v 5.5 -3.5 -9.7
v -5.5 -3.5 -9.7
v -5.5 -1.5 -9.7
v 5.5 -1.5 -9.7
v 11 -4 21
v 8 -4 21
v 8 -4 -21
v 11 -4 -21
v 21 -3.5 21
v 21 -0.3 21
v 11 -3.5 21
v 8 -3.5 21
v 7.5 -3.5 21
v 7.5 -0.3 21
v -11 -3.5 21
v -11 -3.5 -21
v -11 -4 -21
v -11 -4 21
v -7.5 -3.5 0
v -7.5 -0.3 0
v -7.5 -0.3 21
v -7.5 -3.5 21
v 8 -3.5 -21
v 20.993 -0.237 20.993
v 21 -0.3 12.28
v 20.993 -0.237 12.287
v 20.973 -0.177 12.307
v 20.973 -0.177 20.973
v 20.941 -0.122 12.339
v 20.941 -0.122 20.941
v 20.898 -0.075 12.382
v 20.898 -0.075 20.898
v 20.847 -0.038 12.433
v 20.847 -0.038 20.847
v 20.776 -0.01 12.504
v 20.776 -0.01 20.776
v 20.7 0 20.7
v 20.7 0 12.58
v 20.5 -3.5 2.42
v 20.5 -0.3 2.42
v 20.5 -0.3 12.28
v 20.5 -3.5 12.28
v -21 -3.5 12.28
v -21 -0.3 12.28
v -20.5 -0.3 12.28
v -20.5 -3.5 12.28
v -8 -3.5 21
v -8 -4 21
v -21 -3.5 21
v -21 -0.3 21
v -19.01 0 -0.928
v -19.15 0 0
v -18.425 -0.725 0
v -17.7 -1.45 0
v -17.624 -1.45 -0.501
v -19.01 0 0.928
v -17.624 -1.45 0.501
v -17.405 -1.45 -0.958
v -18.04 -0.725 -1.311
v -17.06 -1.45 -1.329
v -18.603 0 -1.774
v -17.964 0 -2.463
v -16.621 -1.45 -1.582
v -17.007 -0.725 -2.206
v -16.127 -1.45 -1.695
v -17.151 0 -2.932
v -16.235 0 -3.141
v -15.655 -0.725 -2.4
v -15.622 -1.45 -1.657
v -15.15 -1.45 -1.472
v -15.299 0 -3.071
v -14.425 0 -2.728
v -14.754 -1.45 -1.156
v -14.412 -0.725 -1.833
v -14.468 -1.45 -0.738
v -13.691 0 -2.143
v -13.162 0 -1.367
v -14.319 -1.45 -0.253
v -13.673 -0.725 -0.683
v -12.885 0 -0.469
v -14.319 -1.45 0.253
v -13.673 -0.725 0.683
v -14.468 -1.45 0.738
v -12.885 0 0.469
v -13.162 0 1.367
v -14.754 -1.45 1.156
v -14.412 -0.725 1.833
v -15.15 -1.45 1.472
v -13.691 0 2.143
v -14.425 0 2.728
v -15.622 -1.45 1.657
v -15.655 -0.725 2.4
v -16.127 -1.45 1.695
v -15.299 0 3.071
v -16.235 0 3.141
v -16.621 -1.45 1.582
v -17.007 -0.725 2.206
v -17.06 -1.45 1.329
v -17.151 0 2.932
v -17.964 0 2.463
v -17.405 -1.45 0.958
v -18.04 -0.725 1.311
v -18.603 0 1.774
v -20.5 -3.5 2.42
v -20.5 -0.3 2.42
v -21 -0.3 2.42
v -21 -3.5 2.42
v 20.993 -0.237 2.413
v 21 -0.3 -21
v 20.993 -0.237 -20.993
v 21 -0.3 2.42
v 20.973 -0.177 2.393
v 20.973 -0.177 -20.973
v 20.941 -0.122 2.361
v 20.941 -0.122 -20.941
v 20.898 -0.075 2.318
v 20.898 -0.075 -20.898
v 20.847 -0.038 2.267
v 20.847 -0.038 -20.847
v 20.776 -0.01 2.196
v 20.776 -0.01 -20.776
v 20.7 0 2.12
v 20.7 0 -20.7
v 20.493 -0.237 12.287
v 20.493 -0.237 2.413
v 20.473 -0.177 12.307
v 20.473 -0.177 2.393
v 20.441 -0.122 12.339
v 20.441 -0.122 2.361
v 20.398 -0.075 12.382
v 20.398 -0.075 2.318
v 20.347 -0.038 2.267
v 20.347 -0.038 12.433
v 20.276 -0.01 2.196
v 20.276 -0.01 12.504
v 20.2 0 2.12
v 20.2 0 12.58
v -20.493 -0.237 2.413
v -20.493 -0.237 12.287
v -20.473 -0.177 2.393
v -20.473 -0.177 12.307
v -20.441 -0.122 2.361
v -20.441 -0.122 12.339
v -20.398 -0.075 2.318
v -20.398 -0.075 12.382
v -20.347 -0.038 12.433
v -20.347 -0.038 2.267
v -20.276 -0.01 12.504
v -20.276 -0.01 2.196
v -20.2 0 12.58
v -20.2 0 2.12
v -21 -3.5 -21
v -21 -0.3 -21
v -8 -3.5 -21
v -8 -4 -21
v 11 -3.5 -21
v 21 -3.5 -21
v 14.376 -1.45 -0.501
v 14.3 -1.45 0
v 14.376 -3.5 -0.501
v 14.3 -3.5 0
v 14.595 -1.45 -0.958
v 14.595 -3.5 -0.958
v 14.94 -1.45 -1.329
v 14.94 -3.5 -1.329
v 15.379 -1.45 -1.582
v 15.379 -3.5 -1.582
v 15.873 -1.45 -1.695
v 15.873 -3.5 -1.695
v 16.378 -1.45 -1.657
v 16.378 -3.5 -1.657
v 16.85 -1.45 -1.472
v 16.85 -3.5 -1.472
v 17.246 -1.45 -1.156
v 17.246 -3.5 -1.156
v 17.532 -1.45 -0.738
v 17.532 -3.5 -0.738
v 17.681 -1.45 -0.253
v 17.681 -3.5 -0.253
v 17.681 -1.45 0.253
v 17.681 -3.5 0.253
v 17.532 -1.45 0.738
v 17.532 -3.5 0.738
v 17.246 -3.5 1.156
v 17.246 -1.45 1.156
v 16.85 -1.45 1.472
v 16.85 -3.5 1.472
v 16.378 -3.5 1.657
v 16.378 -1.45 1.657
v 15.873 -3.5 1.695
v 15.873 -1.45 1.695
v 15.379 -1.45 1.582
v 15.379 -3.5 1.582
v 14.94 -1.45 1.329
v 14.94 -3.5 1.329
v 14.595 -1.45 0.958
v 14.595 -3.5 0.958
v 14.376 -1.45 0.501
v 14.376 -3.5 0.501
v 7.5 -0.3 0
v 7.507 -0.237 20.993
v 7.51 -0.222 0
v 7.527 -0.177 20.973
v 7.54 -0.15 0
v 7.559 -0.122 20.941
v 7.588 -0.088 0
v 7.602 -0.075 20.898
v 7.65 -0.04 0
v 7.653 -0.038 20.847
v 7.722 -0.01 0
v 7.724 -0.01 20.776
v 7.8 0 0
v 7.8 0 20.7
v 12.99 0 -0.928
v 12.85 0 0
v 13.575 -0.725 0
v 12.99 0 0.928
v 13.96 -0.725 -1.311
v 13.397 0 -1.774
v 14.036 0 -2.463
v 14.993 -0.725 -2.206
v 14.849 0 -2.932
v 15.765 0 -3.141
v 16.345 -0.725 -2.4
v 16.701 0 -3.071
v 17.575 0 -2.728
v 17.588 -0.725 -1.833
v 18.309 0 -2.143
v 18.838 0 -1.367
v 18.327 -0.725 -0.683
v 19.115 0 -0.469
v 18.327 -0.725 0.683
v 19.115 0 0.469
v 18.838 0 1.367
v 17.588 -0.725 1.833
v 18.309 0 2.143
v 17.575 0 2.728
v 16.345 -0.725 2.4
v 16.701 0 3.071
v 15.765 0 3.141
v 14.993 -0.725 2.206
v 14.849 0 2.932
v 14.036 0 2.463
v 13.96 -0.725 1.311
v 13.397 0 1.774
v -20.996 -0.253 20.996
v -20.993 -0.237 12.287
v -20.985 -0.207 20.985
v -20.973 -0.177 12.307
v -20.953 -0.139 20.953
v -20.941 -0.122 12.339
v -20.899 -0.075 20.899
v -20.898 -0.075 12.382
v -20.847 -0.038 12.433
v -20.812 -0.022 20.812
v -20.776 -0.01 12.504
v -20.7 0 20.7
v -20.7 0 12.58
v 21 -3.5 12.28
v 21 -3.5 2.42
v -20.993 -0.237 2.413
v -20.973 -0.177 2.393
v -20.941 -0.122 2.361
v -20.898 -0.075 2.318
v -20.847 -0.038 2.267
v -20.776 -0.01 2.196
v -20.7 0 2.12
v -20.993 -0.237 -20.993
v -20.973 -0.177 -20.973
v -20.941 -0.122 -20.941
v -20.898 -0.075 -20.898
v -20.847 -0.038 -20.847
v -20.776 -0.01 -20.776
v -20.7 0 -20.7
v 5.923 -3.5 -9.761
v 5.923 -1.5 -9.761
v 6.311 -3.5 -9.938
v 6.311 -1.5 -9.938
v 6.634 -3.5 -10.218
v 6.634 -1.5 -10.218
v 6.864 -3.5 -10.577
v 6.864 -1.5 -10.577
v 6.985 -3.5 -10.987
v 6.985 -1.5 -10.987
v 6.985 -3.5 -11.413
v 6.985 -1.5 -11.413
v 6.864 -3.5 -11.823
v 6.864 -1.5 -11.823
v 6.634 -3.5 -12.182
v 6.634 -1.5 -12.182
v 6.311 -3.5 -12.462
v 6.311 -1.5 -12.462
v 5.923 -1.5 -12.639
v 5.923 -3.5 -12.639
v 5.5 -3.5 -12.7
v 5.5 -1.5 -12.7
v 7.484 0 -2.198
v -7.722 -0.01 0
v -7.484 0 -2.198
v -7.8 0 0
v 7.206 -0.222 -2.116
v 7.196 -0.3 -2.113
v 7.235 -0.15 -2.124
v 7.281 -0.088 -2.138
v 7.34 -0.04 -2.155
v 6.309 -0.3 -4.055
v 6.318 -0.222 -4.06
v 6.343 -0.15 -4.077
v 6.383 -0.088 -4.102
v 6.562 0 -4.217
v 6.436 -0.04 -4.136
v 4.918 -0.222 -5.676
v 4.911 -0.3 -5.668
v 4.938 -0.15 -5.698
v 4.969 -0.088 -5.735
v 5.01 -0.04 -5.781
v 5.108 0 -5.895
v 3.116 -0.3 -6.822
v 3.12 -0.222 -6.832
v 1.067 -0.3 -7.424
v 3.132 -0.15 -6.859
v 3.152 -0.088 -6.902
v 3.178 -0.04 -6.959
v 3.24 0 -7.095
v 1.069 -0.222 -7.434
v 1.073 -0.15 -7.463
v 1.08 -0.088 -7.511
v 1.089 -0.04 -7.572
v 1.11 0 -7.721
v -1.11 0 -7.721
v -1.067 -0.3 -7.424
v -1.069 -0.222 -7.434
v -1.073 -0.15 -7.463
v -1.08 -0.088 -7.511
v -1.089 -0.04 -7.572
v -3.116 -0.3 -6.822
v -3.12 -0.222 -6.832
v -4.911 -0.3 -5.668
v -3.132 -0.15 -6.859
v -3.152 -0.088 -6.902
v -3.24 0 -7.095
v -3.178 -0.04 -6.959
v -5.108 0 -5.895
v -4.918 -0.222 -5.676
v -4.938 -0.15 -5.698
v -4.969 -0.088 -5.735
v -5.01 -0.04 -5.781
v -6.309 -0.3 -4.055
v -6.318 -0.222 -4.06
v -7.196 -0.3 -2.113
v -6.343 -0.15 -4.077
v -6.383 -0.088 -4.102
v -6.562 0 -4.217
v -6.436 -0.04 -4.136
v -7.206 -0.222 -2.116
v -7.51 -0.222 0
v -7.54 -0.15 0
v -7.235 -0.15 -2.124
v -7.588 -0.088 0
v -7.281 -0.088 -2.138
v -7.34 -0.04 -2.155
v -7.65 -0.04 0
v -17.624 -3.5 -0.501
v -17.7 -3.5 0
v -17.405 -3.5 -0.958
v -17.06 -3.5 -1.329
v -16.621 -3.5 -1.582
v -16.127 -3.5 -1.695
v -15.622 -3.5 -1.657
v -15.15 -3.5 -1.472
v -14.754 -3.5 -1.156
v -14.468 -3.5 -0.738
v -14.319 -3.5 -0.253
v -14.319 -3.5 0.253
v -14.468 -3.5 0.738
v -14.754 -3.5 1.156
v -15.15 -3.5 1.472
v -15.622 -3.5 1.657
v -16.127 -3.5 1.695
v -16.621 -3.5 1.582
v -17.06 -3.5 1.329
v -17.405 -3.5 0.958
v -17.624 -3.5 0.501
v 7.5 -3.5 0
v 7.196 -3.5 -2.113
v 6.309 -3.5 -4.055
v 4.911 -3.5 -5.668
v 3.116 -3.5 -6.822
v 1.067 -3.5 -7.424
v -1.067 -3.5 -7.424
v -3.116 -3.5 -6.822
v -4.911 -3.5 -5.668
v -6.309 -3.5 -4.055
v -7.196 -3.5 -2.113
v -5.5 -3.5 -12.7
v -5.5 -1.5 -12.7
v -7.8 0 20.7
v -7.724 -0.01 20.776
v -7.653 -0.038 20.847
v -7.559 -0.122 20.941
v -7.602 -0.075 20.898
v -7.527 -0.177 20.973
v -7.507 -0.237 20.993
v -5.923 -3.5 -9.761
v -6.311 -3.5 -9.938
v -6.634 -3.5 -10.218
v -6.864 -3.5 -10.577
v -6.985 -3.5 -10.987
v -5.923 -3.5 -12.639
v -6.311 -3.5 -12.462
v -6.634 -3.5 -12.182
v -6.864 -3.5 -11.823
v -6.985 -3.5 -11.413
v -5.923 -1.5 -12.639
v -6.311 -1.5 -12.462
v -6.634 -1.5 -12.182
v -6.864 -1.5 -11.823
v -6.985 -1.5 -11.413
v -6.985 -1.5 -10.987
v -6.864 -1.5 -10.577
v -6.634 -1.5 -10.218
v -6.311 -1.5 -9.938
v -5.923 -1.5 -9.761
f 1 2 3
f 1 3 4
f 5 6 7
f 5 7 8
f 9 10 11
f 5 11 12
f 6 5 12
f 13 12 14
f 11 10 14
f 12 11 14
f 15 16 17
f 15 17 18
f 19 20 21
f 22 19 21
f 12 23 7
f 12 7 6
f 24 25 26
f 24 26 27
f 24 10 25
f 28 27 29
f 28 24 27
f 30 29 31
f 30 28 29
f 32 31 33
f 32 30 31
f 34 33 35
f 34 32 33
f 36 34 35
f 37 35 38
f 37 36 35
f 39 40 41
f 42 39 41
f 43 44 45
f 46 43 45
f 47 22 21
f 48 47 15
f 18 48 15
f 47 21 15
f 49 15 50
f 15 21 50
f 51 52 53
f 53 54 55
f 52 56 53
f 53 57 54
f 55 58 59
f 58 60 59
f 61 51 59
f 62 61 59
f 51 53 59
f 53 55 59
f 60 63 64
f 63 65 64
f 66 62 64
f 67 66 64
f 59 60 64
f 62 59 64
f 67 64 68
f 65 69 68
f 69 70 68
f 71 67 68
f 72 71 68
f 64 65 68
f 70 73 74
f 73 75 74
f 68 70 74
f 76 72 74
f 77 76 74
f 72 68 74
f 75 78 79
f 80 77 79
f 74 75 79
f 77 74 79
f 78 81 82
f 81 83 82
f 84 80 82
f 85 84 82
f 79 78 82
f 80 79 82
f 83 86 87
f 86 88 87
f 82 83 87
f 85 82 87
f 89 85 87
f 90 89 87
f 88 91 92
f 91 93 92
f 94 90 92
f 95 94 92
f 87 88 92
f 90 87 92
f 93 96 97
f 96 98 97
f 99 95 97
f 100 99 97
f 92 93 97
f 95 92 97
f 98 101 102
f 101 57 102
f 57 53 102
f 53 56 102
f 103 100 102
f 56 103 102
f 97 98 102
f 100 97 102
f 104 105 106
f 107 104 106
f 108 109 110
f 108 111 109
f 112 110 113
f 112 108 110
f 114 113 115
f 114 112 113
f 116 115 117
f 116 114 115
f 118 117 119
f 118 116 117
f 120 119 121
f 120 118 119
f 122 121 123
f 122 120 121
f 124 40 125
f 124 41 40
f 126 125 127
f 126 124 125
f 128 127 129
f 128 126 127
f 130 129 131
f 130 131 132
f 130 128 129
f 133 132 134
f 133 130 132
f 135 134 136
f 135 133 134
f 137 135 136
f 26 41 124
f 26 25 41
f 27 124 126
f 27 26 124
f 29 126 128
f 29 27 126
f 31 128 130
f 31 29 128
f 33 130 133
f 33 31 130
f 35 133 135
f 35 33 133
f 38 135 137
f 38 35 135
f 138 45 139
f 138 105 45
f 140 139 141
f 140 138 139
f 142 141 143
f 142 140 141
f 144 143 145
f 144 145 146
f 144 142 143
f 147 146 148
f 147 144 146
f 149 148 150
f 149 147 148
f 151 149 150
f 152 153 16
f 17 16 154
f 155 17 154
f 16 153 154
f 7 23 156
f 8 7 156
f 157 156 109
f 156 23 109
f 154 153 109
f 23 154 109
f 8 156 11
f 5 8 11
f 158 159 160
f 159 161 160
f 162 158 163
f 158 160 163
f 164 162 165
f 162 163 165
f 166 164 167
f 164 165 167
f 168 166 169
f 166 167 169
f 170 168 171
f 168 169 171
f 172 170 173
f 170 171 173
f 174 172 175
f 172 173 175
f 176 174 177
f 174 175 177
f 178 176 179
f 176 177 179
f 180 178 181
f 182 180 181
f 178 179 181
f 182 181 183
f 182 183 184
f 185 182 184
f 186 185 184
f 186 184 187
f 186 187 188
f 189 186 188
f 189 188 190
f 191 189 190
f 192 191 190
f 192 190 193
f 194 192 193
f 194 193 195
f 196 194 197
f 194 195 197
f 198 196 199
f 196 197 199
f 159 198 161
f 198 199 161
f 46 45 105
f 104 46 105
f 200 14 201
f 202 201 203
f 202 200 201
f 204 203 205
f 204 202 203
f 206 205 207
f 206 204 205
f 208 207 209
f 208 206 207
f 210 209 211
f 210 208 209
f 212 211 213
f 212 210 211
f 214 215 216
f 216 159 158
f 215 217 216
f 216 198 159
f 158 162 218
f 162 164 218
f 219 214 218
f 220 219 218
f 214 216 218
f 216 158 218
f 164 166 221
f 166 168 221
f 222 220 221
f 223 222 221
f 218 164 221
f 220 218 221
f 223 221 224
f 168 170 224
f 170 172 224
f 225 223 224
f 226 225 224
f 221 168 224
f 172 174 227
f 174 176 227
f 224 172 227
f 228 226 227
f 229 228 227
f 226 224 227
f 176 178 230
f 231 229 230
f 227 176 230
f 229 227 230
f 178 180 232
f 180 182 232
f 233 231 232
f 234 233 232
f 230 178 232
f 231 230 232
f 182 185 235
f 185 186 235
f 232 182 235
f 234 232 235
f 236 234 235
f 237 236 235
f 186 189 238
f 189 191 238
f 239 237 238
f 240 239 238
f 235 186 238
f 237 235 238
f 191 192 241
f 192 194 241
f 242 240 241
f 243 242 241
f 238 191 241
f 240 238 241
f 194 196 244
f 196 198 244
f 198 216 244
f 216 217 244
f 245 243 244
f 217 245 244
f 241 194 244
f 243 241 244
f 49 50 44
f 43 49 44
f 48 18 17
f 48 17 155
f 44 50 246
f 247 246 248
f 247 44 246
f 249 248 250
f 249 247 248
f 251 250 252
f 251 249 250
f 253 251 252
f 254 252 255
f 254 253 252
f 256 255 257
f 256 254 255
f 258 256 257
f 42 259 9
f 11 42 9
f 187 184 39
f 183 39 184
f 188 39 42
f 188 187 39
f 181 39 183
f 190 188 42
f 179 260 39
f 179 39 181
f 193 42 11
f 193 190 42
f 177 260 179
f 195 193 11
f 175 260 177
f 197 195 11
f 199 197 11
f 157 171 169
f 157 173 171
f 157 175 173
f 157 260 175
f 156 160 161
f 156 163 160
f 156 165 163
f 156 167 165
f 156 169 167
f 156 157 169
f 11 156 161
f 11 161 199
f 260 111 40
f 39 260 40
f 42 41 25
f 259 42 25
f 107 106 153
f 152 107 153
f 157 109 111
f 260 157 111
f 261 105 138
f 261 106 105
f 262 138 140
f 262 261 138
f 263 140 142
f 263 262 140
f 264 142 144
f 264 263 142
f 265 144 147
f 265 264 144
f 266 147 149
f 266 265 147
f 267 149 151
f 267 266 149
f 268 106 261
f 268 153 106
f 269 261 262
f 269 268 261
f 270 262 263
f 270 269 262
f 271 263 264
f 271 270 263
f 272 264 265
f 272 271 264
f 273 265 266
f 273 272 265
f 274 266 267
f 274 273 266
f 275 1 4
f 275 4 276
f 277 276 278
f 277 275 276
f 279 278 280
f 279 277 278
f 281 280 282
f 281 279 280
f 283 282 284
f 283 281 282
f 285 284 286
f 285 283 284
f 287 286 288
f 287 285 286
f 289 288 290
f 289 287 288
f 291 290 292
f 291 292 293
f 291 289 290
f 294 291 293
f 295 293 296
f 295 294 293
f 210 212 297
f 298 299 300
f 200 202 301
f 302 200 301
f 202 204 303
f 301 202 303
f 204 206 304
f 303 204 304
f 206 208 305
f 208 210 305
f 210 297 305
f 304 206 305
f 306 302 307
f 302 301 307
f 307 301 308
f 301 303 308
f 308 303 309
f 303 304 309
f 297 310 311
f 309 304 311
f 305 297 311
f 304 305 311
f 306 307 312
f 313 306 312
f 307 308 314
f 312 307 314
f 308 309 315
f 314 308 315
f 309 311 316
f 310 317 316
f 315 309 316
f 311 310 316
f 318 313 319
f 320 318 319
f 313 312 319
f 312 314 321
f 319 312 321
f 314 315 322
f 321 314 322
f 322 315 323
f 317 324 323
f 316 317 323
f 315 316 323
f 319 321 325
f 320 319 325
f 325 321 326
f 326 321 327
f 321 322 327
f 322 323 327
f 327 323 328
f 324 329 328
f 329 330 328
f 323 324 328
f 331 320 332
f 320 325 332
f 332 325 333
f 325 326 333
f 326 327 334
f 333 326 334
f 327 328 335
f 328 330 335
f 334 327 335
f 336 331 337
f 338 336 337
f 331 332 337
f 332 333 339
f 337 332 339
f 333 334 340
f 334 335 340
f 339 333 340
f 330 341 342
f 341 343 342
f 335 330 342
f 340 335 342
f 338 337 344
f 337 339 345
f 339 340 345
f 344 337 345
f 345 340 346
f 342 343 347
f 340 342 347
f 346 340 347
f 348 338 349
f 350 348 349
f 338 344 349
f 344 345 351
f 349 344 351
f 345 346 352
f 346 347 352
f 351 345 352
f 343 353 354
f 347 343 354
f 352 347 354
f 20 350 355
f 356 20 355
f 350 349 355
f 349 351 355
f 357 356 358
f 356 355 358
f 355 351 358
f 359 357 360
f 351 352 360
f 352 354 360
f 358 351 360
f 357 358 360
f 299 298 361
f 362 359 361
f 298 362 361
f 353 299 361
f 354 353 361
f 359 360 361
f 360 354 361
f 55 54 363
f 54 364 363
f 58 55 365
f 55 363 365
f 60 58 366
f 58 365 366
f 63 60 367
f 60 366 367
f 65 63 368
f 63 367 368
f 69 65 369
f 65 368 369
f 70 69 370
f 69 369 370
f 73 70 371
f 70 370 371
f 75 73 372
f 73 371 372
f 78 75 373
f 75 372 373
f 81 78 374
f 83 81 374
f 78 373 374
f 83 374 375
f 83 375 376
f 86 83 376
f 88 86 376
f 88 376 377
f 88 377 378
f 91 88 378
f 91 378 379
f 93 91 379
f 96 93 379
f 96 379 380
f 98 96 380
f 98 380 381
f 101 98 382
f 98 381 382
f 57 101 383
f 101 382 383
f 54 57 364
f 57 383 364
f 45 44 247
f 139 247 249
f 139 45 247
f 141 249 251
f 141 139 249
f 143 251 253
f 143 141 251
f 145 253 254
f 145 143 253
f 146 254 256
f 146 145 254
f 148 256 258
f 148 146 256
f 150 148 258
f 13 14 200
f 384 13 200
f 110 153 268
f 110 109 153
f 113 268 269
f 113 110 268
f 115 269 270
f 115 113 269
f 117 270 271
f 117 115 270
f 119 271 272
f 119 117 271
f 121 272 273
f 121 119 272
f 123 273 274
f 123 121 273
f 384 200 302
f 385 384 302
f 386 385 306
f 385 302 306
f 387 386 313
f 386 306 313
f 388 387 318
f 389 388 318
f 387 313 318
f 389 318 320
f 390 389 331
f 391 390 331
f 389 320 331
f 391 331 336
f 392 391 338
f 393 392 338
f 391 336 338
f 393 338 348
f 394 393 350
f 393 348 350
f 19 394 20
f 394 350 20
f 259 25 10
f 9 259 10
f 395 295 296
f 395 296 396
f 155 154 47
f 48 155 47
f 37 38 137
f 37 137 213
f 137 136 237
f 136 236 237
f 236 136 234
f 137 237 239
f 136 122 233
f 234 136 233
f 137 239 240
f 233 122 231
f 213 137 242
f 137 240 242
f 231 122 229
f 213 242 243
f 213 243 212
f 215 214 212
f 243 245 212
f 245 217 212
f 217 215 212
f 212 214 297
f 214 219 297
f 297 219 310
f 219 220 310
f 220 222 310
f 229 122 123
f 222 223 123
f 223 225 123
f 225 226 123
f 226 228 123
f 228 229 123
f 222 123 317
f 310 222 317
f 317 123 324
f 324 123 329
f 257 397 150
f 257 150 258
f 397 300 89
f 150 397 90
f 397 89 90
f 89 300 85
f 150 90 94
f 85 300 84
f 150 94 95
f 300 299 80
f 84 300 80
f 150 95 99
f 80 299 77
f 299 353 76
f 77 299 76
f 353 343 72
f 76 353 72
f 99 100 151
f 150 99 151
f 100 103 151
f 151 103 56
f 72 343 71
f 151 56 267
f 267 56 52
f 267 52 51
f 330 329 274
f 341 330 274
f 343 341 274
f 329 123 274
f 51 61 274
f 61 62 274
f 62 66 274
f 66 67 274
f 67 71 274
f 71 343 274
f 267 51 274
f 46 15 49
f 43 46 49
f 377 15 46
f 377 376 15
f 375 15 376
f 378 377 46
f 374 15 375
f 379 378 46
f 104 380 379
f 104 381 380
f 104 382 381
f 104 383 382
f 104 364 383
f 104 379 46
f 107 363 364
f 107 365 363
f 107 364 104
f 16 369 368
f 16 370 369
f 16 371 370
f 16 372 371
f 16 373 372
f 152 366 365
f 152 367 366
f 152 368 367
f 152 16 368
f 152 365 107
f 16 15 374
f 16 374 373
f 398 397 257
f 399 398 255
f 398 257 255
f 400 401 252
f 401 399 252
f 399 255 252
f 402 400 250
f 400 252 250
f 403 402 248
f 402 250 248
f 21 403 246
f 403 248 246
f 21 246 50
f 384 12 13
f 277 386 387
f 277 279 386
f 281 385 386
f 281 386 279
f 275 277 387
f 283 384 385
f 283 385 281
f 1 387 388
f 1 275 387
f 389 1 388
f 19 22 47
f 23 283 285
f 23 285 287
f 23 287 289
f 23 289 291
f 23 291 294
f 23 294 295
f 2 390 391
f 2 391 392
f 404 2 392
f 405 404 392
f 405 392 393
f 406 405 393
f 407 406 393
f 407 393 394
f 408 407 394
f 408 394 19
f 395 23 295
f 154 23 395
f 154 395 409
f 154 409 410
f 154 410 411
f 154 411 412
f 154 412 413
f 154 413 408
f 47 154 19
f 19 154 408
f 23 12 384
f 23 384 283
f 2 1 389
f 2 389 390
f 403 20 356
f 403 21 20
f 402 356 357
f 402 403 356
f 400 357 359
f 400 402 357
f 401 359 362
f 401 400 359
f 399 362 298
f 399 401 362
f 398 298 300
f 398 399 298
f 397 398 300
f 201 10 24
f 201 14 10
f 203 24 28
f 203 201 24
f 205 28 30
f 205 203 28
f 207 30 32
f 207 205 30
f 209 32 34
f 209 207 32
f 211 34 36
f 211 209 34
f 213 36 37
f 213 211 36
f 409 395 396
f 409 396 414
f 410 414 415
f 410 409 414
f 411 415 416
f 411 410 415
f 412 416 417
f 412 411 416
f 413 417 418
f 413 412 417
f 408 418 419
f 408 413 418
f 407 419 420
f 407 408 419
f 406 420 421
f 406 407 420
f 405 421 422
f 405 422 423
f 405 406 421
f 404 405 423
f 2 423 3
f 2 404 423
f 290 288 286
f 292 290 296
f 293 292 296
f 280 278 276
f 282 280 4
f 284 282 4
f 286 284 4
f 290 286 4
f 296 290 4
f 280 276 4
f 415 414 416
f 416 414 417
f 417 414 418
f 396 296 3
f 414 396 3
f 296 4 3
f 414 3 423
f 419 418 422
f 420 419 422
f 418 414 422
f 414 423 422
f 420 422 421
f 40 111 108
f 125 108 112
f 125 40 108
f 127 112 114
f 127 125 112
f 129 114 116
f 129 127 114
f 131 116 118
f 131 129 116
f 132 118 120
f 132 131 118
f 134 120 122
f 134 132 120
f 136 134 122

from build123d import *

# Parameters (mm, degrees)
SALIENTE_EXTRUIR1_DEPTH                              = 3.5
AVELLANADO_PARA_TORNILLO_CON_CABEZA_PLAN_D           = 3.4
AVELLANADO_PARA_TORNILLO_CON_CABEZA_PLAN_CSINK_D     = 6.3
AVELLANADO_PARA_TORNILLO_CON_CABEZA_PLAN_CSINK_ANGLE = 90
REDONDEO1_R                                          = 0.3
CROQUIS4_W                                           = 3
CROQUIS4_H                                           = 42
SALIENTE_EXTRUIR2_DEPTH                              = 0.5
CORTAR_EXTRUIR1_DEPTH                                = 2


with BuildPart() as part:
    # Croquis1 → Saliente-Extruir1 (new body)
    with BuildSketch(Plane(origin=(0, 0, 0), x_dir=(1, 0, 0), z_dir=(0, 1, 0))):
        with BuildLine():
            Line((-7.5, 0), (-7.5, -21))
            Line((-7.5, -21), (-21, -21))
            Line((-21, -21), (-21, -12.28))
            Line((-21, -12.28), (-20.5, -12.28))
            Line((-20.5, -12.28), (-20.5, -2.42))
            Line((-20.5, -2.42), (-21, -2.42))
            Line((-21, -2.42), (-21, 21))
            Line((-21, 21), (21, 21))
            Line((21, 21), (21, -2.42))
            Line((21, -2.42), (20.5, -2.42))
            Line((20.5, -2.42), (20.5, -12.28))
            Line((20.5, -12.28), (21, -12.28))
            Line((21, -12.28), (21, -21))
            Line((21, -21), (7.5, -21))
            Line((7.5, -21), (7.5, 0))
            ThreePointArc((7.5, 0), (0, 7.5), (-7.5, 0))
        make_face()
    extrude(amount=-SALIENTE_EXTRUIR1_DEPTH)

    # Avellanado para tornillo con cabeza plana avellanada de M31 (through all)
    with Locations(Plane(origin=(0, 0, 0), x_dir=(1, 0, 0), z_dir=(0, 1, 0))):
        with Locations((-16, 0), (16, 0)):
            CounterSinkHole(AVELLANADO_PARA_TORNILLO_CON_CABEZA_PLAN_D / 2, AVELLANADO_PARA_TORNILLO_CON_CABEZA_PLAN_CSINK_D / 2, counter_sink_angle=AVELLANADO_PARA_TORNILLO_CON_CABEZA_PLAN_CSINK_ANGLE)

    # Redondeo1
    redondeo1_edges = [part.edges().sort_by_distance(p)[0] for p in [
        (14.25, 0, 21),
        (7.5, 0, 10.5),
        (0, 0, -7.5),
        (-7.5, 0, 10.5),
        (-14.25, 0, 21),
        (-21, 0, 16.64),
        (-20.75, 0, 12.28),
        (-20.5, 0, 7.35),
        (-20.75, 0, 2.42),
        (-21, 0, -9.29),
        (0, 0, -21),
        (21, 0, -9.29),
        (20.75, 0, 2.42),
        (20.5, 0, 7.35),
        (20.75, 0, 12.28),
        (21, 0, 16.64),
    ]]
    fillet(redondeo1_edges, radius=REDONDEO1_R)

    # Croquis4 → Saliente-Extruir2 (add)
    with BuildSketch(Plane.XZ.offset(3.5)):
        with Locations((9.5, 0)):
            Rectangle(CROQUIS4_W, CROQUIS4_H)
        with Locations((-9.5, 0)):
            Rectangle(CROQUIS4_W, CROQUIS4_H)
    extrude(amount=SALIENTE_EXTRUIR2_DEPTH)

    # Croquis5 → Cortar-Extruir1 (cut)
    with BuildSketch(Plane.XZ.offset(3.5)):
        with BuildLine():
            Line((-5.5, -9.7), (5.5, -9.7))
            ThreePointArc((5.5, -9.7), (7, -11.2), (5.5, -12.7))
            Line((5.5, -12.7), (-5.5, -12.7))
            ThreePointArc((-5.5, -12.7), (-7, -11.2), (-5.5, -9.7))
        make_face()
    extrude(amount=-CORTAR_EXTRUIR1_DEPTH, mode=Mode.SUBTRACT)


solid = part.part
